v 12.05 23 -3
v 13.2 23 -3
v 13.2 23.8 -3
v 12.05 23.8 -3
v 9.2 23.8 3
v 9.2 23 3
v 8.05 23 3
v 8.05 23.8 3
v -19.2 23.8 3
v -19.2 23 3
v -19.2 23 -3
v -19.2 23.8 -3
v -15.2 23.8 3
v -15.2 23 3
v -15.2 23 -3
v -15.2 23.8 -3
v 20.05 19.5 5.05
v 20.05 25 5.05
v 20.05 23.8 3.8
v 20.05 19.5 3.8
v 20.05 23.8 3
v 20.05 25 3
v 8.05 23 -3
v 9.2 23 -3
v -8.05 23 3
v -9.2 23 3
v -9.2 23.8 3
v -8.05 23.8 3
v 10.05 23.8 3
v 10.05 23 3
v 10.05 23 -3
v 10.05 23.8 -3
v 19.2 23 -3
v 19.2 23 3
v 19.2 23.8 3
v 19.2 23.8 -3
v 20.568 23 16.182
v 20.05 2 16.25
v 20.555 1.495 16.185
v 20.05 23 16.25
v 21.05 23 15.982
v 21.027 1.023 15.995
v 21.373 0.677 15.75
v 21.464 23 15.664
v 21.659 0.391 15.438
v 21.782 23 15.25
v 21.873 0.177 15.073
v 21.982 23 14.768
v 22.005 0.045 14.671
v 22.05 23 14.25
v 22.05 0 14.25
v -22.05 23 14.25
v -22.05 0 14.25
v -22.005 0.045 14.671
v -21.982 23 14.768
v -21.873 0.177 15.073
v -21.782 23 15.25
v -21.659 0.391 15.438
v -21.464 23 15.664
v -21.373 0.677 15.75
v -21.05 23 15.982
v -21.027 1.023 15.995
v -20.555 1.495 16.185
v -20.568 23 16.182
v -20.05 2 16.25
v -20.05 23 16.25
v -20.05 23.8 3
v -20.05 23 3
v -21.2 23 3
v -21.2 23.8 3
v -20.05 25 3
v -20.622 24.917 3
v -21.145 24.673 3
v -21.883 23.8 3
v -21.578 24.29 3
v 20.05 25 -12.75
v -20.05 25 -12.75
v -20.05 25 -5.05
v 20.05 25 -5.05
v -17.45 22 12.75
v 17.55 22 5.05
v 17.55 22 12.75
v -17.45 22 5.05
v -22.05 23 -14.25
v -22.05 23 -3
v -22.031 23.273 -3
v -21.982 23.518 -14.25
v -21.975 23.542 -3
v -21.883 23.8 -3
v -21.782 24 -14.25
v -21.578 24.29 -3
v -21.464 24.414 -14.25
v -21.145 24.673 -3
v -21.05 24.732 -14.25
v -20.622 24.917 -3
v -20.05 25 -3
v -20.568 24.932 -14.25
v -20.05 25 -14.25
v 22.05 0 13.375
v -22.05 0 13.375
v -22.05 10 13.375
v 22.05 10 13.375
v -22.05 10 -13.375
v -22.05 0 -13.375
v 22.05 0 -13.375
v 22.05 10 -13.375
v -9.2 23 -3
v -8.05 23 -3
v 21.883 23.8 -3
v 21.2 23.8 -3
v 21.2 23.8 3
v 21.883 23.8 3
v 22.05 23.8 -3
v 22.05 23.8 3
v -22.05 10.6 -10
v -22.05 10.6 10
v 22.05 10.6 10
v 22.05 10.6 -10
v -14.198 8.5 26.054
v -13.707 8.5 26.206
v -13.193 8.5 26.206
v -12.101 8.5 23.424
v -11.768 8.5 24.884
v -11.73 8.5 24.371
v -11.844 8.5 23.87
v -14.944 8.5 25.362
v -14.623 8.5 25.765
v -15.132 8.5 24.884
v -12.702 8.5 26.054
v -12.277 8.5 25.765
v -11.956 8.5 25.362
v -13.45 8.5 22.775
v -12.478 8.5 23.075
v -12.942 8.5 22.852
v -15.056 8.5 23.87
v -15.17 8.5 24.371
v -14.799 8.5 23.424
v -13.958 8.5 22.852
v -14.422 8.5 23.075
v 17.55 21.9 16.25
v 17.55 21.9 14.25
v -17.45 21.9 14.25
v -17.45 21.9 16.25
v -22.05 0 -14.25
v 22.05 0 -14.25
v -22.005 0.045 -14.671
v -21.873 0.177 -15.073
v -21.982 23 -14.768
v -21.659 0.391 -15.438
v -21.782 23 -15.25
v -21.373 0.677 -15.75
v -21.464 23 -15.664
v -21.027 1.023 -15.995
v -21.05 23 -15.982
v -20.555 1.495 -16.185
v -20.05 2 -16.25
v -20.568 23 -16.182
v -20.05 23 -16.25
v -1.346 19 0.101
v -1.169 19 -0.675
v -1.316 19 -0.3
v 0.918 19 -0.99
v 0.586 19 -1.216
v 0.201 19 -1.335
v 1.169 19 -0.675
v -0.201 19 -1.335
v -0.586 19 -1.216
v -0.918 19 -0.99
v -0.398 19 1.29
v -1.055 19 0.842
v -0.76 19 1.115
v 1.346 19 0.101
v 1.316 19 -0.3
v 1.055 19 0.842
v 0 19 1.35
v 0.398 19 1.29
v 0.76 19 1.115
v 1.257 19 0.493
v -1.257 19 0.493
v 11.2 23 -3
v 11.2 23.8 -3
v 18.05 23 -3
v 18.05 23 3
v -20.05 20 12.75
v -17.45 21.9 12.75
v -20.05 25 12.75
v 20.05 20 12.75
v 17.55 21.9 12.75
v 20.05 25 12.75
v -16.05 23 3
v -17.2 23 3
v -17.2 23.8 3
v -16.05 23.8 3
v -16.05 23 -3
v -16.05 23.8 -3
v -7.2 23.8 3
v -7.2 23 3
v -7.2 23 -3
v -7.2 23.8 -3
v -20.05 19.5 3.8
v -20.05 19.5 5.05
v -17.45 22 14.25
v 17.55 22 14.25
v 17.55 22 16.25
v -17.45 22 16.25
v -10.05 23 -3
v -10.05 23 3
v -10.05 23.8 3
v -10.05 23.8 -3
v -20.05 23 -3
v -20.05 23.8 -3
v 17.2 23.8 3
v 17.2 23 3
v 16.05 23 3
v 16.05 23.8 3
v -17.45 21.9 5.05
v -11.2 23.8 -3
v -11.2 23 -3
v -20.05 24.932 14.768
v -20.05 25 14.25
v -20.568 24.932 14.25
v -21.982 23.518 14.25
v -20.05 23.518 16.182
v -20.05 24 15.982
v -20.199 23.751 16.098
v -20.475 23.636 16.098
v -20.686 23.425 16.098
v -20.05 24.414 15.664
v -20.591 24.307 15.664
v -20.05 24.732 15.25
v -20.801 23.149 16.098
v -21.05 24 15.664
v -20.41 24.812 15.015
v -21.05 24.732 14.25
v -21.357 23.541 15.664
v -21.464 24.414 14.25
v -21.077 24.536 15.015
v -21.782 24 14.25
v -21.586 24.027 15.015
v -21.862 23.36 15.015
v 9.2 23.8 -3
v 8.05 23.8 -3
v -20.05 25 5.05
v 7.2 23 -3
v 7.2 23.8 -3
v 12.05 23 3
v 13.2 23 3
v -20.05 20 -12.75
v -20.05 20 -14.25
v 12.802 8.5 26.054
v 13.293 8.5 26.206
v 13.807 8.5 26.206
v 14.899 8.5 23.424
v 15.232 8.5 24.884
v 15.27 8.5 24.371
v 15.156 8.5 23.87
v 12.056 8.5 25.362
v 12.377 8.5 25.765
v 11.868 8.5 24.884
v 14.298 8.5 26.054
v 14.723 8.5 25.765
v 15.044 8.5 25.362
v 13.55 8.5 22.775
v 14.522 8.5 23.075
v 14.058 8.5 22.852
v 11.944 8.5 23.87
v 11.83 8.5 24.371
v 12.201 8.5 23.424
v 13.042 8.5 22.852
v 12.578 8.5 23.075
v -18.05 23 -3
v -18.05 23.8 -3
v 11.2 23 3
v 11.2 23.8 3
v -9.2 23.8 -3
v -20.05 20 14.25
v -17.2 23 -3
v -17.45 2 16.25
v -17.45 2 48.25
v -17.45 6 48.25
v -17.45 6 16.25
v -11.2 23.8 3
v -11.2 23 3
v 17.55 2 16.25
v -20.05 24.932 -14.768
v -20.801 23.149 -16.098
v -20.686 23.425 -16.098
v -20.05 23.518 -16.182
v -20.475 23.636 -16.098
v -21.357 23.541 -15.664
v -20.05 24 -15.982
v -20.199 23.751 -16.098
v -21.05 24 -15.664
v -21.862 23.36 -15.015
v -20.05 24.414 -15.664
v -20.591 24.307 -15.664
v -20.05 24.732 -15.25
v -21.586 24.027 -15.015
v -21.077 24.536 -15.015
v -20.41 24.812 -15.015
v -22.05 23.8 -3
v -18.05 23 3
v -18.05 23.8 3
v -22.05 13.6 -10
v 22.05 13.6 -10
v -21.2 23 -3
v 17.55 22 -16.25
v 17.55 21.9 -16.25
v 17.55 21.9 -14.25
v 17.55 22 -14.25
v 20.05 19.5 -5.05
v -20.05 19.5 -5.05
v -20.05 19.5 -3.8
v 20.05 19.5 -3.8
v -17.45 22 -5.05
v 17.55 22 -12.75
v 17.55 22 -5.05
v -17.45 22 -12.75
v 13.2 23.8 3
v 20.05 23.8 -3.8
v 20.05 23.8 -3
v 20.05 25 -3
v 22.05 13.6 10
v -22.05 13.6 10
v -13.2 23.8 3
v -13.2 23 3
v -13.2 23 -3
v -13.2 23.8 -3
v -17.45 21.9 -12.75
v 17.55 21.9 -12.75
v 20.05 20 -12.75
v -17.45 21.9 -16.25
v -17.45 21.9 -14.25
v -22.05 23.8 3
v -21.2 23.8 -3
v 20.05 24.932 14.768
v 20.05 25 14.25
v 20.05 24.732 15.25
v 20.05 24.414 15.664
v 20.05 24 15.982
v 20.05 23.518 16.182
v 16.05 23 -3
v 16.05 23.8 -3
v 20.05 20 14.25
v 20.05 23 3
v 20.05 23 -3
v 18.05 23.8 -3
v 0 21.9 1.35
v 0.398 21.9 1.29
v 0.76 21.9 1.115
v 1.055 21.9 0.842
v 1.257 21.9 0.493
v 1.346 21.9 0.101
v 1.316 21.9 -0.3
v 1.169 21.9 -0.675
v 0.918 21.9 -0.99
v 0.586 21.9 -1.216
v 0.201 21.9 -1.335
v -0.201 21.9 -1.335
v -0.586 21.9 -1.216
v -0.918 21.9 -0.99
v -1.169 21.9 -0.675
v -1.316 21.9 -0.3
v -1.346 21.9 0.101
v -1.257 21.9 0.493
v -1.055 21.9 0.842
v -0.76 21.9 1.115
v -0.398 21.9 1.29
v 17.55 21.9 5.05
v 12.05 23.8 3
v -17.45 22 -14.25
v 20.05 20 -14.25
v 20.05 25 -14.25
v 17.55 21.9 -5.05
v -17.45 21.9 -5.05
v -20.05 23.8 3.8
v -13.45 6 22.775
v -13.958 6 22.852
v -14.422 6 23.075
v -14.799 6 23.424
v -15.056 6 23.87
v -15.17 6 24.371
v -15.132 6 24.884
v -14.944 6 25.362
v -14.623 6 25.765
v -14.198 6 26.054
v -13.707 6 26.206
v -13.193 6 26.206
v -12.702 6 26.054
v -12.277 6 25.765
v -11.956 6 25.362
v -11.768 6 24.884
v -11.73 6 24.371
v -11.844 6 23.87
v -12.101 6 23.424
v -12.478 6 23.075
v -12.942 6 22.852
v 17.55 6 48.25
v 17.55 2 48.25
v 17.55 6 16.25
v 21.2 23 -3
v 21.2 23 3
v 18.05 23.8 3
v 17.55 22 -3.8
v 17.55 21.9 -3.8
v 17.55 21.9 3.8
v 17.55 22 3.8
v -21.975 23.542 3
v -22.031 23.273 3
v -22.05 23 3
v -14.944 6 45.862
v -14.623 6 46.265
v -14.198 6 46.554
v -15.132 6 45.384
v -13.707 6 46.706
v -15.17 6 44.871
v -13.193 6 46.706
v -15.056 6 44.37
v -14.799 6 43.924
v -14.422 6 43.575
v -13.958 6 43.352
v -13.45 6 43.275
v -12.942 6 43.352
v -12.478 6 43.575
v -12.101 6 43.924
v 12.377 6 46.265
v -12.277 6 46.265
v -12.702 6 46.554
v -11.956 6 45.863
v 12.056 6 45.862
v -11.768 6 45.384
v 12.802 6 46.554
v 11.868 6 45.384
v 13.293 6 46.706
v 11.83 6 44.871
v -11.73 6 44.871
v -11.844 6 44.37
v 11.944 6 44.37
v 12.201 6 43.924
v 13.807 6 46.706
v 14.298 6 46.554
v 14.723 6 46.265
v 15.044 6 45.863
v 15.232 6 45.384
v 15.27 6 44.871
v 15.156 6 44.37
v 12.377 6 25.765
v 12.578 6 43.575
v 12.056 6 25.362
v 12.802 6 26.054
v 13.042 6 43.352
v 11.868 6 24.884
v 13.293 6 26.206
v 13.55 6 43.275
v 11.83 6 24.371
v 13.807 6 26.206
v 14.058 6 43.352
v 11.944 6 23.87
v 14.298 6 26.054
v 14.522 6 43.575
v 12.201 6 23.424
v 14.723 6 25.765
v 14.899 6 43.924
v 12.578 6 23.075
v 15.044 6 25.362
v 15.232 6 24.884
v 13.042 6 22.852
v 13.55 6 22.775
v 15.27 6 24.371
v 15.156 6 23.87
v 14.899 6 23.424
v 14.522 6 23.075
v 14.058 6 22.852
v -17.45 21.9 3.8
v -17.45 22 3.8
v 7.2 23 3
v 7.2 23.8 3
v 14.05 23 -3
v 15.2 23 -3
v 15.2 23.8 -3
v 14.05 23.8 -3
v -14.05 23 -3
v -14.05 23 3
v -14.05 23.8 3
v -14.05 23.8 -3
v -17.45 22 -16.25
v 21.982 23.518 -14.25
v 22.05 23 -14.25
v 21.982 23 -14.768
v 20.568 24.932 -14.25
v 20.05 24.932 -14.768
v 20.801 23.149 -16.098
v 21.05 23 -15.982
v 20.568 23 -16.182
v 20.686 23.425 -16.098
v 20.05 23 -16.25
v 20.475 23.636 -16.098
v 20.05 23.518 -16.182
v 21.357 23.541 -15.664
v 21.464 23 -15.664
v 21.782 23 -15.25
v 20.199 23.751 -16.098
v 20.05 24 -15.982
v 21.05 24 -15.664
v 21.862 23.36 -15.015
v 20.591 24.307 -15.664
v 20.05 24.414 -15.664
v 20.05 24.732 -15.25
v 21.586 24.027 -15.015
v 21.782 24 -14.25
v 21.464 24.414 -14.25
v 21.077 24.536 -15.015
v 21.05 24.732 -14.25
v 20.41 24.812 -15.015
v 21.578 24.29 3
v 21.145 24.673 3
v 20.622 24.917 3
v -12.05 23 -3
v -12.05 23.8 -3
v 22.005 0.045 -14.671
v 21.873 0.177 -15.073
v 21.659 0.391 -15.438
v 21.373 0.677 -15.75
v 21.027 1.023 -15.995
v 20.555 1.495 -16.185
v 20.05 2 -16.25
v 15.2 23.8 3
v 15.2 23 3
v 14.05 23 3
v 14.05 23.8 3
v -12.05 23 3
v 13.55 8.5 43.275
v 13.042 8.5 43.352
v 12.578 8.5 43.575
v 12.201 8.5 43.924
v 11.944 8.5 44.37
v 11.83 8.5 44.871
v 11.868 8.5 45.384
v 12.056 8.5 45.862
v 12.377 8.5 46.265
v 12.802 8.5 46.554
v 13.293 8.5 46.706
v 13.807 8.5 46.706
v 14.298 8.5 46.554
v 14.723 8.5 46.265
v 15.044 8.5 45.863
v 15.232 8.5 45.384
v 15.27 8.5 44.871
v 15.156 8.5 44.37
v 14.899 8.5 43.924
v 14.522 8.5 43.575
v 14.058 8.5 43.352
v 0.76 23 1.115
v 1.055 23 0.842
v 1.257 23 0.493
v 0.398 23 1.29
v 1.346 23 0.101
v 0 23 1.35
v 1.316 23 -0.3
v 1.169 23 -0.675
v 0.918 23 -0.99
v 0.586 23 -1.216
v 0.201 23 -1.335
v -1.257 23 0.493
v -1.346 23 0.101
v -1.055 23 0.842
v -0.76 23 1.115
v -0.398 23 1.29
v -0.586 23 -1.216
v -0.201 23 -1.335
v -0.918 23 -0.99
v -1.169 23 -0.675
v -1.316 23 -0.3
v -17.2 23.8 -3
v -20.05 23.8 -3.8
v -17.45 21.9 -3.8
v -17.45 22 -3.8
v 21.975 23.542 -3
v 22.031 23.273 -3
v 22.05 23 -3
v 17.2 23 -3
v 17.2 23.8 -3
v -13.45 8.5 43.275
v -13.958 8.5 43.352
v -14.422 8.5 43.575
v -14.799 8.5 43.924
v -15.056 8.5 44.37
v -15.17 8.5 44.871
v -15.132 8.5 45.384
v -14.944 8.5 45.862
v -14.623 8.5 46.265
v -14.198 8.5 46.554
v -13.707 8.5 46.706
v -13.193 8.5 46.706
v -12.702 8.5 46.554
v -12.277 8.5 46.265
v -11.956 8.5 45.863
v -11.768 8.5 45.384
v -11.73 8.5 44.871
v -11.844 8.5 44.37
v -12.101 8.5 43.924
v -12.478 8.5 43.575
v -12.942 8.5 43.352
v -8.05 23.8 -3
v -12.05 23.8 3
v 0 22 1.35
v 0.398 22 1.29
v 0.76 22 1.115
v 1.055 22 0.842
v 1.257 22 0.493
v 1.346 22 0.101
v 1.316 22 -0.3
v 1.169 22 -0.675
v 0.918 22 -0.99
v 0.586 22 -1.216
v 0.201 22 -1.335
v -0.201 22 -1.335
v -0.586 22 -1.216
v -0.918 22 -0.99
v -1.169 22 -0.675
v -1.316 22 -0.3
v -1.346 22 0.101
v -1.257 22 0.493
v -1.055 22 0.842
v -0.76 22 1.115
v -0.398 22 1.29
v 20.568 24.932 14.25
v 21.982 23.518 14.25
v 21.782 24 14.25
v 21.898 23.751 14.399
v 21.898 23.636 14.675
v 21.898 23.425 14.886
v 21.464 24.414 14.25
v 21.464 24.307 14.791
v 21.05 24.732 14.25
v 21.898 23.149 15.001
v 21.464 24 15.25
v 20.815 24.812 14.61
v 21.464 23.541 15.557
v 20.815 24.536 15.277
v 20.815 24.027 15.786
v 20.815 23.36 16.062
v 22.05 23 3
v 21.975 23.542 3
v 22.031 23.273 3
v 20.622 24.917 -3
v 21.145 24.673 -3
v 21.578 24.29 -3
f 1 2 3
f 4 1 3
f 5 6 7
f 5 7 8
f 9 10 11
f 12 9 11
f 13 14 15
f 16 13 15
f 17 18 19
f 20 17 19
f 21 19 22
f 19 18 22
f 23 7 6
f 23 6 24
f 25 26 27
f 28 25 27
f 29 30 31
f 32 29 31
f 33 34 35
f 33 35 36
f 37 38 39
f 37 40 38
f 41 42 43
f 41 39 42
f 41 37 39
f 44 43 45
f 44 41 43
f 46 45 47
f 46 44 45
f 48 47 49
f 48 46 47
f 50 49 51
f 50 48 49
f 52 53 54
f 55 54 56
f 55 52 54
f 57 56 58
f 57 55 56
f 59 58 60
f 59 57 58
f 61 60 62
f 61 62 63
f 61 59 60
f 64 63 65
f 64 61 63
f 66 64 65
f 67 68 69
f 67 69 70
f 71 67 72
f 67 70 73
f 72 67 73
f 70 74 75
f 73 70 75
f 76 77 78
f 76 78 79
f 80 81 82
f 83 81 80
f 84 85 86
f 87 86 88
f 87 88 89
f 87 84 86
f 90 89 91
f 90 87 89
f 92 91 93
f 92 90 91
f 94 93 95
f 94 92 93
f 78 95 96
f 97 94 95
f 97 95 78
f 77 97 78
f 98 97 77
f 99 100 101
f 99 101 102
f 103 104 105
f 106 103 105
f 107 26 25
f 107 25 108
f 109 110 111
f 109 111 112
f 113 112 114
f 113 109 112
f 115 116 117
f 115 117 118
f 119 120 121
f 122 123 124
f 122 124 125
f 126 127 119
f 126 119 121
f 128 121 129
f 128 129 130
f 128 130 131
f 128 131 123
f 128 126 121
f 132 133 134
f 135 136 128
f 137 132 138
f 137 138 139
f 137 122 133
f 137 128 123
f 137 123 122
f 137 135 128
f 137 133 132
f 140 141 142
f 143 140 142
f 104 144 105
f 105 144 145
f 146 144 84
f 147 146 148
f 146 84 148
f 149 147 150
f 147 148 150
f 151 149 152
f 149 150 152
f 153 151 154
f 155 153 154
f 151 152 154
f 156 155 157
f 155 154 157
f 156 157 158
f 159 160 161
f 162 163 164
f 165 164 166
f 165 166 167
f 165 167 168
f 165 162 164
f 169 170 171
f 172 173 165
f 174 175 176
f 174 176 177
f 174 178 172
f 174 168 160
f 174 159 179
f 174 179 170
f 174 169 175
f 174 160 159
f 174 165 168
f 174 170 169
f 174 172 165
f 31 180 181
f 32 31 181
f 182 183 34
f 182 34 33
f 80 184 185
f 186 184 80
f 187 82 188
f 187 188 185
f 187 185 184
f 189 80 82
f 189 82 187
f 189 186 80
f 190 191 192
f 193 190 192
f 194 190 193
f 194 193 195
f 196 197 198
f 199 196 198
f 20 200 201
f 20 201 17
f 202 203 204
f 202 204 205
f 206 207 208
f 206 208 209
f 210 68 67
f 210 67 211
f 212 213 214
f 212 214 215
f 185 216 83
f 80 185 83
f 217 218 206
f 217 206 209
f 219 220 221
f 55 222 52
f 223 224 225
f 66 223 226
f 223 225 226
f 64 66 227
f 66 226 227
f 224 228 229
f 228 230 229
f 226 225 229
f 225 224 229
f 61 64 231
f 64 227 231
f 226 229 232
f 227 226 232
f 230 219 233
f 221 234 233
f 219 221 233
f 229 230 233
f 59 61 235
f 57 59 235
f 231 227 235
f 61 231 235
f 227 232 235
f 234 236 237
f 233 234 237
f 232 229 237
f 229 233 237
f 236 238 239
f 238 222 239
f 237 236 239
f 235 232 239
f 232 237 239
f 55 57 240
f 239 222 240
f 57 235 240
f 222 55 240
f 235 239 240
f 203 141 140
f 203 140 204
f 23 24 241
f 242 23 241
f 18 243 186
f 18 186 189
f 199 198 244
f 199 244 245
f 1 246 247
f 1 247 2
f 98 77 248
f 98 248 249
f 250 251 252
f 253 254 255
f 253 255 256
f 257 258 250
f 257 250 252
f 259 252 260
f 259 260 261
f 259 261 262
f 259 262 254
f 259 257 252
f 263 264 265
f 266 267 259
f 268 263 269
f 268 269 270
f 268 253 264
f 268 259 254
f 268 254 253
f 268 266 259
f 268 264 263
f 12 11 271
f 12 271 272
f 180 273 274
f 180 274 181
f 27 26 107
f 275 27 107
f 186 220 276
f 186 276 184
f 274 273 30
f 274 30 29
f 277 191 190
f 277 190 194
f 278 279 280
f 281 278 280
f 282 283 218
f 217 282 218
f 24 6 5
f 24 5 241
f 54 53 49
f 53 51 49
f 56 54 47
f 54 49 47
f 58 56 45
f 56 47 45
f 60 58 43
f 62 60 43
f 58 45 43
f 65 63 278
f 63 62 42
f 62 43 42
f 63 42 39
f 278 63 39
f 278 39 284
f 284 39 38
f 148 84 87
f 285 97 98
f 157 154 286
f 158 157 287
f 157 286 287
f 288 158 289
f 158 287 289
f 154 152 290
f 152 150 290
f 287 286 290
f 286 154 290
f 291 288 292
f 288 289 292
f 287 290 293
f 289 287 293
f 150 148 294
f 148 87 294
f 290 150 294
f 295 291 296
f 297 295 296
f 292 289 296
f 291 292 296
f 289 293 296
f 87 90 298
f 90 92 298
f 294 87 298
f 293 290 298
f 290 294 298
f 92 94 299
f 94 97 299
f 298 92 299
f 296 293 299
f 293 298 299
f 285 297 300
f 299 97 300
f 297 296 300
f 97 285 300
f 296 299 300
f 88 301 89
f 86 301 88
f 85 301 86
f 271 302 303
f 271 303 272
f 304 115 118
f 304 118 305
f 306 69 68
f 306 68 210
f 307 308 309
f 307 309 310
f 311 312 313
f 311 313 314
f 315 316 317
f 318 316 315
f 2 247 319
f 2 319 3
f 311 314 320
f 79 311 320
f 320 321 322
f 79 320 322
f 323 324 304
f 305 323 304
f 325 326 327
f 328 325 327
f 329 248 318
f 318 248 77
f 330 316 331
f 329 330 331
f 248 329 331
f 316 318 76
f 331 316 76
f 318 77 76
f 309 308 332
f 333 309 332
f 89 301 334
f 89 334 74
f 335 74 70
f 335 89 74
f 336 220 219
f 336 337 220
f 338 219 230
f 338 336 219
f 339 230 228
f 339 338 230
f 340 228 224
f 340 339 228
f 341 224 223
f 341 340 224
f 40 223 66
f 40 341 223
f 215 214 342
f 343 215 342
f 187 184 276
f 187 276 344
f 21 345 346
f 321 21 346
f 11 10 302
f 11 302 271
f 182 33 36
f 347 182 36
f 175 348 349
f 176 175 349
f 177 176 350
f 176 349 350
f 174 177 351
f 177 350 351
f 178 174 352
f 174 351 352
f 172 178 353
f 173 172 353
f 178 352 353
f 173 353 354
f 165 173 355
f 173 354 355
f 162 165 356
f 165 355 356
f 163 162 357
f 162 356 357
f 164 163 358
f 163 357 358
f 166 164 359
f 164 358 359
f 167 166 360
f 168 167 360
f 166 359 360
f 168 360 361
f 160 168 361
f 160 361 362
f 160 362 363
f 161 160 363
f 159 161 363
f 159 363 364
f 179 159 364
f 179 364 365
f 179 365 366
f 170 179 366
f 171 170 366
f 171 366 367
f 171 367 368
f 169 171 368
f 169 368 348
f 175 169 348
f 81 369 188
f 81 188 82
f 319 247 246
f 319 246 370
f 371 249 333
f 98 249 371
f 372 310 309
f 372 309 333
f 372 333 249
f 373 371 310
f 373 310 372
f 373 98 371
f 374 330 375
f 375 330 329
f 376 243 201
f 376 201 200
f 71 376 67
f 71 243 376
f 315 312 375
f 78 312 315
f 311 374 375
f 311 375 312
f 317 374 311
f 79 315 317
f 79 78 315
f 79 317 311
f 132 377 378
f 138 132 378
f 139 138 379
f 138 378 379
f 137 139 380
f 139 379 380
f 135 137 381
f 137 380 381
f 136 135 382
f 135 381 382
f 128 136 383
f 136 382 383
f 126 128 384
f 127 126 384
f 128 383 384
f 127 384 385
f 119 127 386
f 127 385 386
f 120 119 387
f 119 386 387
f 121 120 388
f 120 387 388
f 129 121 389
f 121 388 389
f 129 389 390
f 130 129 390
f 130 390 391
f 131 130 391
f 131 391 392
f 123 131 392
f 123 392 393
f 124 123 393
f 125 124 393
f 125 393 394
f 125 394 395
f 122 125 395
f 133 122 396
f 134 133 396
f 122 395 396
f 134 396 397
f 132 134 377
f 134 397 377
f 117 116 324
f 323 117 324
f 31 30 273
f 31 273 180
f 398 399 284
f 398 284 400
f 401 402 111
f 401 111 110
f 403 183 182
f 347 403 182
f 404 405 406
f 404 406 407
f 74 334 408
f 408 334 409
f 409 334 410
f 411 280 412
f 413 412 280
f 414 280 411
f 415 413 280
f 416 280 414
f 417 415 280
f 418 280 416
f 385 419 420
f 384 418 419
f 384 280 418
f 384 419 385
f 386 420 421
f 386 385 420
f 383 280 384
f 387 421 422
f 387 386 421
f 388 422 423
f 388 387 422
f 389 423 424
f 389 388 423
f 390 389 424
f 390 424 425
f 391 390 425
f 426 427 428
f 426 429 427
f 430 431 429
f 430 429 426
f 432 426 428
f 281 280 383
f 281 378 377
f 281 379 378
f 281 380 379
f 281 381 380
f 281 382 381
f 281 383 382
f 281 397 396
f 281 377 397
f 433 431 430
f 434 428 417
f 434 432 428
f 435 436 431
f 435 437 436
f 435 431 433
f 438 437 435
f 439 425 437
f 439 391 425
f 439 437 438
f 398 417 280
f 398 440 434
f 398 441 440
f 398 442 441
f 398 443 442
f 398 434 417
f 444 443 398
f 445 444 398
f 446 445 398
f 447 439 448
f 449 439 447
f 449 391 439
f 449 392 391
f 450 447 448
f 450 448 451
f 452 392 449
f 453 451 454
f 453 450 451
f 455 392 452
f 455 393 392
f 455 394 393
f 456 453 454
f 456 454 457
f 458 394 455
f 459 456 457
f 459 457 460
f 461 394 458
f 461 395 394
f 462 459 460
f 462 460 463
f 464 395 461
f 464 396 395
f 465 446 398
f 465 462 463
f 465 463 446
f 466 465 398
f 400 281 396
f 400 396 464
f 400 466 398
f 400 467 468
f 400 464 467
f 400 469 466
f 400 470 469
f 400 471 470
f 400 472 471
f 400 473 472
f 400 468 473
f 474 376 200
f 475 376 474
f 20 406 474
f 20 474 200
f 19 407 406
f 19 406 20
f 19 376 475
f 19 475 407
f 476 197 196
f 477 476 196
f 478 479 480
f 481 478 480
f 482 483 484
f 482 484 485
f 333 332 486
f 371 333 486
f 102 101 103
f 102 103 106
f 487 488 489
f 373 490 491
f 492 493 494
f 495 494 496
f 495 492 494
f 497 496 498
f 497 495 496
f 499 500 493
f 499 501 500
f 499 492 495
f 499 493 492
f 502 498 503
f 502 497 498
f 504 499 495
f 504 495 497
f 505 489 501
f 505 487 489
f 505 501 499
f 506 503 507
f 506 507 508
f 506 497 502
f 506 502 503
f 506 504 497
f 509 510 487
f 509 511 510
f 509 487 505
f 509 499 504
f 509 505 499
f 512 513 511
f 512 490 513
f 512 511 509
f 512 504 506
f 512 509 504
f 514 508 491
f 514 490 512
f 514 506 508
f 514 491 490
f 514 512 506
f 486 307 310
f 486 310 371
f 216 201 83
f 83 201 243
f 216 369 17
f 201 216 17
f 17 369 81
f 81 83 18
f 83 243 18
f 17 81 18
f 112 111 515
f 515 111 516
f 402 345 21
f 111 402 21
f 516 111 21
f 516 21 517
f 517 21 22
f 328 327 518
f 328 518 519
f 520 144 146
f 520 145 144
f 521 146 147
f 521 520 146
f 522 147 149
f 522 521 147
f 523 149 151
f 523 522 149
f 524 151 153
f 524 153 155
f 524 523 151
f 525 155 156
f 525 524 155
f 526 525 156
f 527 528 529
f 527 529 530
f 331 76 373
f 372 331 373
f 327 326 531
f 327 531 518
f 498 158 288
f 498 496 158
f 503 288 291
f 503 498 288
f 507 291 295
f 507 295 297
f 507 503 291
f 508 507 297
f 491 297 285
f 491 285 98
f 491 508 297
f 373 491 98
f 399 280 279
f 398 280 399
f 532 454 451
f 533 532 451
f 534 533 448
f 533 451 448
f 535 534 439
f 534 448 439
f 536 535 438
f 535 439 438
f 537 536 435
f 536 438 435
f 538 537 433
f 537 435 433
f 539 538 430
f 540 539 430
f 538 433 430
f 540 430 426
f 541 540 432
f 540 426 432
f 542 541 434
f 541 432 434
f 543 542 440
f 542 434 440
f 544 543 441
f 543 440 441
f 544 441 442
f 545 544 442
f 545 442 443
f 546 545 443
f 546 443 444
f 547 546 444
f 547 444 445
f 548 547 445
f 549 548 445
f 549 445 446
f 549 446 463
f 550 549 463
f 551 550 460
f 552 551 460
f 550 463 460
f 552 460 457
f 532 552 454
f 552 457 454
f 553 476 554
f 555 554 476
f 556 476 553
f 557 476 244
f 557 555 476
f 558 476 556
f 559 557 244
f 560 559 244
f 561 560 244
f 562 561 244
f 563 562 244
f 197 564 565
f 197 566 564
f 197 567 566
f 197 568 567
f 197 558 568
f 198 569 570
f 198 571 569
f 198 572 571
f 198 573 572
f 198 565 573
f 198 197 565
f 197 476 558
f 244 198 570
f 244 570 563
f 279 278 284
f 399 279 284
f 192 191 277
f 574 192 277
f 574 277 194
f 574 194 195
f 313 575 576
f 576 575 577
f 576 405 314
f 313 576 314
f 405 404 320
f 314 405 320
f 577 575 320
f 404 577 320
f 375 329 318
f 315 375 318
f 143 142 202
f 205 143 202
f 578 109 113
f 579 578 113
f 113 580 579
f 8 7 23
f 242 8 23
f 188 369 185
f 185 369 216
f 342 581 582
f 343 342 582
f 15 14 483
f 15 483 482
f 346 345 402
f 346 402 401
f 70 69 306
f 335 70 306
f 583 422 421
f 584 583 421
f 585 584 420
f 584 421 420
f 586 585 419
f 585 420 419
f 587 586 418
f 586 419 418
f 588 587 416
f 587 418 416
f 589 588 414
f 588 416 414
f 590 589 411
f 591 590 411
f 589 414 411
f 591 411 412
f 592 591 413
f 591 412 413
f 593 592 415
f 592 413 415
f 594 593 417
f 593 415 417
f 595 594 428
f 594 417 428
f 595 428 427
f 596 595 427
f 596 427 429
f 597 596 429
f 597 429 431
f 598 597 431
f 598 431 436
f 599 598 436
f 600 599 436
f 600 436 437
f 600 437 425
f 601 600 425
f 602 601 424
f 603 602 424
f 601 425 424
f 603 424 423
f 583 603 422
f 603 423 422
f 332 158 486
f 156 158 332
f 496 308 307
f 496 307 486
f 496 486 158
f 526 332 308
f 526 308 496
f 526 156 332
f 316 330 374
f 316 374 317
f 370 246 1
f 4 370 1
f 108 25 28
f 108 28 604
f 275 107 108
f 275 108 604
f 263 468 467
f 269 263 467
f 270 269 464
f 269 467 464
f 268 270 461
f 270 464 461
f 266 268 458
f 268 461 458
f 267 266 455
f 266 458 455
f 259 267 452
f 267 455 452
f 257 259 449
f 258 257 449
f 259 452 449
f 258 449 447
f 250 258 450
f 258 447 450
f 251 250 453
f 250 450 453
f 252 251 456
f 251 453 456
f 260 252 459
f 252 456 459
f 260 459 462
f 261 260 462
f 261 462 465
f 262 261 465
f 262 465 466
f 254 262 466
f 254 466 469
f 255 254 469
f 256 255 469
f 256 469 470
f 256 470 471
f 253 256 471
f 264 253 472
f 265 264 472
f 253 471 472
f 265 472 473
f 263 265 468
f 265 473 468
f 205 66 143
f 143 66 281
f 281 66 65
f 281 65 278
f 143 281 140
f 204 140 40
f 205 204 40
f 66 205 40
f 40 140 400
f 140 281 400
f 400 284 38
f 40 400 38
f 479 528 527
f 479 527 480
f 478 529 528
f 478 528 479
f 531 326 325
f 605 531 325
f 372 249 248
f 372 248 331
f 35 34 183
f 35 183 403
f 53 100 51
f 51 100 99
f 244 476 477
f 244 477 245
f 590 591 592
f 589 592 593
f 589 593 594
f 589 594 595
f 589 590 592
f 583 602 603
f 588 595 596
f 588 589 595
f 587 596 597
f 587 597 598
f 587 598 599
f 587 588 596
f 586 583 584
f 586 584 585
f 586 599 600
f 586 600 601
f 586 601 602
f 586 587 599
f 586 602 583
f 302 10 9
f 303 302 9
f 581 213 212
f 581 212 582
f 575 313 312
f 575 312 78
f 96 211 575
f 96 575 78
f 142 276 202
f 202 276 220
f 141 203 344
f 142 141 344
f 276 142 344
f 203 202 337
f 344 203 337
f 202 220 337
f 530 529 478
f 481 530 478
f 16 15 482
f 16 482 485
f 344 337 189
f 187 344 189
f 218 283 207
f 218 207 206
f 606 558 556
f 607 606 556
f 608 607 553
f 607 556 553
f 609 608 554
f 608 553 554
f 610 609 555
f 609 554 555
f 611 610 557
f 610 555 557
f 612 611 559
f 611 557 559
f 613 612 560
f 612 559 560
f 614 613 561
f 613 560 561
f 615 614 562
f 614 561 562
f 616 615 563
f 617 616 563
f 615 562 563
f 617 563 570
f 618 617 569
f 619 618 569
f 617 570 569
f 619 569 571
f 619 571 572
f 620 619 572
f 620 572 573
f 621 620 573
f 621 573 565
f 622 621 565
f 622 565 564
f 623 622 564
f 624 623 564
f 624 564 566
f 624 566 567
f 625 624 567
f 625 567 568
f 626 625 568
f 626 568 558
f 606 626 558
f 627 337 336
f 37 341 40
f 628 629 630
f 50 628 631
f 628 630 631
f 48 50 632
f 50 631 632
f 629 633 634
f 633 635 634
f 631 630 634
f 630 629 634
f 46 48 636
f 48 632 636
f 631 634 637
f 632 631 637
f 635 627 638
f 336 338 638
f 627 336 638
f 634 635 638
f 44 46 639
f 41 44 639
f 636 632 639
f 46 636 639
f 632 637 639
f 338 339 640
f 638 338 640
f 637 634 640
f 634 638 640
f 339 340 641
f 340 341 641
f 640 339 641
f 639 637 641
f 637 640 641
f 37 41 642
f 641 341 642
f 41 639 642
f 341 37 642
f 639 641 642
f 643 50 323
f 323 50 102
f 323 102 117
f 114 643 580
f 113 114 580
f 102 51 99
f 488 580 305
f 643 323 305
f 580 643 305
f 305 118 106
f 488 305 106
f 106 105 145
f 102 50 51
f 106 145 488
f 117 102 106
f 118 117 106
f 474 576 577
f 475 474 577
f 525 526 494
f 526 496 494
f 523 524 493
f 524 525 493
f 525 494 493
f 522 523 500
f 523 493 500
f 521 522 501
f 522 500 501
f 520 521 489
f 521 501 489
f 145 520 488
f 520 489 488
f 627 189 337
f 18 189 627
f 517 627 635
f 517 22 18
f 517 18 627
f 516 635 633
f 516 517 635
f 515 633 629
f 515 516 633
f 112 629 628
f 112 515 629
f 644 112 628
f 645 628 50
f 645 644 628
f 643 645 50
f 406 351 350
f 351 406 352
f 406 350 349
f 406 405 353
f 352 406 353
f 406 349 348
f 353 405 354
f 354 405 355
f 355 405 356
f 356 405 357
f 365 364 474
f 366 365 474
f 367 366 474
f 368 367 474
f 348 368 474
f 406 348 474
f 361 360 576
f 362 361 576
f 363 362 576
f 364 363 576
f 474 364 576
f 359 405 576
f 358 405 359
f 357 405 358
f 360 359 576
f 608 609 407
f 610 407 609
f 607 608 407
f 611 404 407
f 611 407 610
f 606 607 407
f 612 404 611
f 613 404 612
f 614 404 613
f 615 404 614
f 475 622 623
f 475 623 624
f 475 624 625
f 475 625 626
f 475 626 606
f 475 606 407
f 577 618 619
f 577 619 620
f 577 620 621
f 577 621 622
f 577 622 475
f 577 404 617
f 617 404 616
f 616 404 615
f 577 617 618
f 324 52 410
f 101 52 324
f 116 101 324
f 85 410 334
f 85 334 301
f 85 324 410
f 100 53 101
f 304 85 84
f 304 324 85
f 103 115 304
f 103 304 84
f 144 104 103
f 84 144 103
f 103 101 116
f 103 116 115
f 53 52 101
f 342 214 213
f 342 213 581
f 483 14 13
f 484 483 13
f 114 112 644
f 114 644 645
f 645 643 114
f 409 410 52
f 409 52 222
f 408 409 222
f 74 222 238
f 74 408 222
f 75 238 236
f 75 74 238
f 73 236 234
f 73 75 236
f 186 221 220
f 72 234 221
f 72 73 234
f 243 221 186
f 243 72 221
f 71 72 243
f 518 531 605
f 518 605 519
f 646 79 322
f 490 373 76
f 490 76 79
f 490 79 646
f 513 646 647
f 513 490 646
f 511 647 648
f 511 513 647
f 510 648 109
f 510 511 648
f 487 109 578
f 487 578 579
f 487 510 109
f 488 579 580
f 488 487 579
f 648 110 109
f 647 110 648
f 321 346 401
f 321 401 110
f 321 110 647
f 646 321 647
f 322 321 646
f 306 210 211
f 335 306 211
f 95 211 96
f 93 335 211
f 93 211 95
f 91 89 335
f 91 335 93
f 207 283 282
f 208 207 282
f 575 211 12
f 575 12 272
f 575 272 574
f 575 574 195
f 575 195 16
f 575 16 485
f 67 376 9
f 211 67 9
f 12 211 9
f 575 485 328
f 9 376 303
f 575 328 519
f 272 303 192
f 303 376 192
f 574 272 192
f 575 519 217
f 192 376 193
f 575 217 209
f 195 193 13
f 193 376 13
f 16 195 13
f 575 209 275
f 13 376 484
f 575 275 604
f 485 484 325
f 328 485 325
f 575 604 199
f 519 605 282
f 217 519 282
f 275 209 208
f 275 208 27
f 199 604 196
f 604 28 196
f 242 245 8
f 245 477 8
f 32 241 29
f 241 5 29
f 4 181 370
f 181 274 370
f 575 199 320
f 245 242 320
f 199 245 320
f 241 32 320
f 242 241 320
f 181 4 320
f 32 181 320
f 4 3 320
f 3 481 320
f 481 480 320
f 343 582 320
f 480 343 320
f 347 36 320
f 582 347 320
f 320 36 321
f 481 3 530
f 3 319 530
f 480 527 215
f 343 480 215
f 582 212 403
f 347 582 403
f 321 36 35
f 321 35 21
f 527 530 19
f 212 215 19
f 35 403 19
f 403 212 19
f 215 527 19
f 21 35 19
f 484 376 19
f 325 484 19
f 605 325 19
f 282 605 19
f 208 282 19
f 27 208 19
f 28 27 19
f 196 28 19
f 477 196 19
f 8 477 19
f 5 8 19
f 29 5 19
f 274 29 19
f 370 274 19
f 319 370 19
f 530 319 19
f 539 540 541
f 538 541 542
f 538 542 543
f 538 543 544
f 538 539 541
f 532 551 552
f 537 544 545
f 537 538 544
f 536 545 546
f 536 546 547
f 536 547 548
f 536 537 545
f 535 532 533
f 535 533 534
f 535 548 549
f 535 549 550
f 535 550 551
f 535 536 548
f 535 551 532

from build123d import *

# Parameters (mm, degrees)
SKETCH1_W               = 44.1
SKETCH1_H               = 32.5
BOSS_EXTRUDE1_DEPTH     = 25
SKETCH2_W               = 44.1
SKETCH2_H               = 26.75
CUT_EXTRUDE1_DEPTH      = 10
FILLET1_R               = 2
CUT_EXTRUDE2_DEPTH      = 38.084565523
CUT_EXTRUDE2_DEPTH_BACK = 38.084565523
SKETCH6_W               = 20
SKETCH6_H               = 3
SKETCH6_W_2             = 6
SKETCH6_H_2             = 2
SKETCH7_W               = 40.1
SKETCH7_H               = 1.25
CUT_EXTRUDE3_DEPTH      = 5.5
SKETCH8_W               = 0.85
SKETCH8_H               = 6
BOSS_EXTRUDE3_DEPTH     = 0.8
SKETCH9_R               = 1.35
CUT_EXTRUDE4_DEPTH      = 4
SKETCH11_W              = 40.1
SKETCH11_H              = 1.2
CUT_EXTRUDE5_DEPTH      = 0.8
SKETCH12_W              = 40.1
SKETCH12_H              = 1.2
CUT_EXTRUDE6_DEPTH      = 0.8
SKETCH13_W              = 35
SKETCH13_H              = 0.1
CUT_EXTRUDE8_DEPTH      = 47.555907251
SKETCH14_W              = 35
SKETCH14_H              = 4
BOSS_EXTRUDE4_DEPTH     = 32
SKETCH15_R              = 1.725
BOSS_EXTRUDE5_DEPTH     = 2.5
SKETCH16_W              = 40.1
SKETCH16_H              = 1.5
CUT_EXTRUDE9_DEPTH      = 5


with BuildPart() as part:
    # Sketch1 → Boss-Extrude1 (new body)
    with BuildSketch(Plane(origin=(0, 0, 0), x_dir=(1, 0, 0), z_dir=(0, 1, 0))):
        Rectangle(SKETCH1_W, SKETCH1_H)
    extrude(amount=BOSS_EXTRUDE1_DEPTH)

    # Sketch2 → Cut-Extrude1 (cut)
    with BuildSketch(Plane.XZ):
        Rectangle(SKETCH2_W, SKETCH2_H)
    extrude(amount=-CUT_EXTRUDE1_DEPTH, mode=Mode.SUBTRACT)

    # Fillet1
    fillet1_edges = [part.edges().sort_by_distance(p)[0] for p in [
        (-22.05, 25, 0),
        (0, 25, 16.25),
        (22.05, 25, 0),
        (0, 0, 16.25),
        (0, 0, -16.25),
        (22.05, 12.5, 16.25),
        (-22.05, 12.5, 16.25),
        (-22.05, 12.5, -16.25),
        (22.05, 12.5, -16.25),
        (0, 25, -16.25),
    ]]
    fillet(fillet1_edges, radius=FILLET1_R)

    # Sketch6 → Cut-Extrude2 (cut, two sides: drawn at the far end of the back side and taken through both)
    with BuildSketch(Plane(origin=(0, 0, 0), x_dir=(0, 0, -1), z_dir=(1, 0, 0)).offset(-CUT_EXTRUDE2_DEPTH_BACK)):
        with Locations((0, 12.1)):
            Rectangle(SKETCH6_W, SKETCH6_H)
        with Locations((0, 24)):
            Rectangle(SKETCH6_W_2, SKETCH6_H_2)
    extrude(amount=CUT_EXTRUDE2_DEPTH + CUT_EXTRUDE2_DEPTH_BACK, mode=Mode.SUBTRACT)

    # Sketch7 → Cut-Extrude3 (cut)
    with BuildSketch(Plane(origin=(0, 25, 0), x_dir=(1, 0, 0), z_dir=(0, 1, 0))):
        with Locations((0, 4.425)):
            Rectangle(SKETCH7_W, SKETCH7_H)
        with Locations((0, -4.425)):
            Rectangle(SKETCH7_W, SKETCH7_H)
    extrude(amount=-CUT_EXTRUDE3_DEPTH, mode=Mode.SUBTRACT)

    # Sketch8 → Boss-Extrude3 (add)
    with BuildSketch(Plane(origin=(0, 23, 0), x_dir=(1, 0, 0), z_dir=(0, 1, 0))):
        with Locations((-21.625, 0)):
            Rectangle(SKETCH8_W, SKETCH8_H)
        with Locations((21.625, 0)):
            Rectangle(SKETCH8_W, SKETCH8_H)
        with Locations((-19.625, 0)):
            Rectangle(SKETCH8_W, SKETCH8_H)
        with Locations((19.625, 0)):
            Rectangle(SKETCH8_W, SKETCH8_H)
        with Locations((-17.625, 0)):
            Rectangle(SKETCH8_W, SKETCH8_H)
        with Locations((17.625, 0)):
            Rectangle(SKETCH8_W, SKETCH8_H)
        with Locations((15.625, 0)):
            Rectangle(SKETCH8_W, SKETCH8_H)
        with Locations((-15.625, 0)):
            Rectangle(SKETCH8_W, SKETCH8_H)
        with Locations((13.625, 0)):
            Rectangle(SKETCH8_W, SKETCH8_H)
        with Locations((-13.625, 0)):
            Rectangle(SKETCH8_W, SKETCH8_H)
        with Locations((11.625, 0)):
            Rectangle(SKETCH8_W, SKETCH8_H)
        with Locations((-11.625, 0)):
            Rectangle(SKETCH8_W, SKETCH8_H)
        with Locations((9.625, 0)):
            Rectangle(SKETCH8_W, SKETCH8_H)
        with Locations((-9.625, 0)):
            Rectangle(SKETCH8_W, SKETCH8_H)
        with Locations((7.625, 0)):
            Rectangle(SKETCH8_W, SKETCH8_H)
        with Locations((-7.625, 0)):
            Rectangle(SKETCH8_W, SKETCH8_H)
    extrude(amount=BOSS_EXTRUDE3_DEPTH)

    # Sketch9 → Cut-Extrude4 (cut)
    with BuildSketch(Plane(origin=(0, 23, 0), x_dir=(1, 0, 0), z_dir=(0, 1, 0))):
        with Locations(Location((0, 0, 0), (0, 0, 270))):
            Circle(SKETCH9_R)
    extrude(amount=-CUT_EXTRUDE4_DEPTH, mode=Mode.SUBTRACT)

    # Sketch11 → Cut-Extrude5 (cut)
    with BuildSketch(Plane(origin=(0, 0, 3), x_dir=(-1, 0, 0), z_dir=(0, 0, -1))):
        with Locations((0, 24.4)):
            Rectangle(SKETCH11_W, SKETCH11_H)
    extrude(amount=-CUT_EXTRUDE5_DEPTH, mode=Mode.SUBTRACT)

    # Sketch12 → Cut-Extrude6 (cut)
    with BuildSketch(Plane.XY.offset(-3)):
        with Locations((0, 24.4)):
            Rectangle(SKETCH12_W, SKETCH12_H)
    extrude(amount=-CUT_EXTRUDE6_DEPTH, mode=Mode.SUBTRACT)

    # Sketch13 → Cut-Extrude8 (cut, through all)
    with BuildSketch(Plane(origin=(0, 0, -16.25), x_dir=(-1, 0, 0), z_dir=(0, 0, -1))):
        with Locations((-0.05, 21.95)):
            Rectangle(SKETCH13_W, SKETCH13_H)
    extrude(amount=-CUT_EXTRUDE8_DEPTH, mode=Mode.SUBTRACT)

    # Sketch14 → Boss-Extrude4 (add)
    with BuildSketch(Plane.XY.offset(16.25)):
        with Locations((0.05, 4)):
            Rectangle(SKETCH14_W, SKETCH14_H)
    extrude(amount=BOSS_EXTRUDE4_DEPTH)

    # Sketch15 → Boss-Extrude5 (add)
    with BuildSketch(Plane(origin=(0, 6, 0), x_dir=(1, 0, 0), z_dir=(0, 1, 0))):
        with Locations(Location((-13.45, -24.5, 0), (0, 0, 90))):
            Circle(SKETCH15_R)
        with Locations(Location((13.55, -24.5, 0), (0, 0, 90))):
            Circle(SKETCH15_R)
        with Locations(Location((13.55, -45, 0), (0, 0, 90))):
            Circle(SKETCH15_R)
        with Locations(Location((-13.45, -45, 0), (0, 0, 90))):
            Circle(SKETCH15_R)
    extrude(amount=BOSS_EXTRUDE5_DEPTH)

    # Sketch16 → Cut-Extrude9 (cut)
    with BuildSketch(Plane(origin=(0, 25, 0), x_dir=(1, 0, 0), z_dir=(0, 1, 0))):
        with Locations((0, 13.5)):
            Rectangle(SKETCH16_W, SKETCH16_H)
        with Locations((0, -13.5)):
            Rectangle(SKETCH16_W, SKETCH16_H)
    extrude(amount=-CUT_EXTRUDE9_DEPTH, mode=Mode.SUBTRACT)


solid = part.part
